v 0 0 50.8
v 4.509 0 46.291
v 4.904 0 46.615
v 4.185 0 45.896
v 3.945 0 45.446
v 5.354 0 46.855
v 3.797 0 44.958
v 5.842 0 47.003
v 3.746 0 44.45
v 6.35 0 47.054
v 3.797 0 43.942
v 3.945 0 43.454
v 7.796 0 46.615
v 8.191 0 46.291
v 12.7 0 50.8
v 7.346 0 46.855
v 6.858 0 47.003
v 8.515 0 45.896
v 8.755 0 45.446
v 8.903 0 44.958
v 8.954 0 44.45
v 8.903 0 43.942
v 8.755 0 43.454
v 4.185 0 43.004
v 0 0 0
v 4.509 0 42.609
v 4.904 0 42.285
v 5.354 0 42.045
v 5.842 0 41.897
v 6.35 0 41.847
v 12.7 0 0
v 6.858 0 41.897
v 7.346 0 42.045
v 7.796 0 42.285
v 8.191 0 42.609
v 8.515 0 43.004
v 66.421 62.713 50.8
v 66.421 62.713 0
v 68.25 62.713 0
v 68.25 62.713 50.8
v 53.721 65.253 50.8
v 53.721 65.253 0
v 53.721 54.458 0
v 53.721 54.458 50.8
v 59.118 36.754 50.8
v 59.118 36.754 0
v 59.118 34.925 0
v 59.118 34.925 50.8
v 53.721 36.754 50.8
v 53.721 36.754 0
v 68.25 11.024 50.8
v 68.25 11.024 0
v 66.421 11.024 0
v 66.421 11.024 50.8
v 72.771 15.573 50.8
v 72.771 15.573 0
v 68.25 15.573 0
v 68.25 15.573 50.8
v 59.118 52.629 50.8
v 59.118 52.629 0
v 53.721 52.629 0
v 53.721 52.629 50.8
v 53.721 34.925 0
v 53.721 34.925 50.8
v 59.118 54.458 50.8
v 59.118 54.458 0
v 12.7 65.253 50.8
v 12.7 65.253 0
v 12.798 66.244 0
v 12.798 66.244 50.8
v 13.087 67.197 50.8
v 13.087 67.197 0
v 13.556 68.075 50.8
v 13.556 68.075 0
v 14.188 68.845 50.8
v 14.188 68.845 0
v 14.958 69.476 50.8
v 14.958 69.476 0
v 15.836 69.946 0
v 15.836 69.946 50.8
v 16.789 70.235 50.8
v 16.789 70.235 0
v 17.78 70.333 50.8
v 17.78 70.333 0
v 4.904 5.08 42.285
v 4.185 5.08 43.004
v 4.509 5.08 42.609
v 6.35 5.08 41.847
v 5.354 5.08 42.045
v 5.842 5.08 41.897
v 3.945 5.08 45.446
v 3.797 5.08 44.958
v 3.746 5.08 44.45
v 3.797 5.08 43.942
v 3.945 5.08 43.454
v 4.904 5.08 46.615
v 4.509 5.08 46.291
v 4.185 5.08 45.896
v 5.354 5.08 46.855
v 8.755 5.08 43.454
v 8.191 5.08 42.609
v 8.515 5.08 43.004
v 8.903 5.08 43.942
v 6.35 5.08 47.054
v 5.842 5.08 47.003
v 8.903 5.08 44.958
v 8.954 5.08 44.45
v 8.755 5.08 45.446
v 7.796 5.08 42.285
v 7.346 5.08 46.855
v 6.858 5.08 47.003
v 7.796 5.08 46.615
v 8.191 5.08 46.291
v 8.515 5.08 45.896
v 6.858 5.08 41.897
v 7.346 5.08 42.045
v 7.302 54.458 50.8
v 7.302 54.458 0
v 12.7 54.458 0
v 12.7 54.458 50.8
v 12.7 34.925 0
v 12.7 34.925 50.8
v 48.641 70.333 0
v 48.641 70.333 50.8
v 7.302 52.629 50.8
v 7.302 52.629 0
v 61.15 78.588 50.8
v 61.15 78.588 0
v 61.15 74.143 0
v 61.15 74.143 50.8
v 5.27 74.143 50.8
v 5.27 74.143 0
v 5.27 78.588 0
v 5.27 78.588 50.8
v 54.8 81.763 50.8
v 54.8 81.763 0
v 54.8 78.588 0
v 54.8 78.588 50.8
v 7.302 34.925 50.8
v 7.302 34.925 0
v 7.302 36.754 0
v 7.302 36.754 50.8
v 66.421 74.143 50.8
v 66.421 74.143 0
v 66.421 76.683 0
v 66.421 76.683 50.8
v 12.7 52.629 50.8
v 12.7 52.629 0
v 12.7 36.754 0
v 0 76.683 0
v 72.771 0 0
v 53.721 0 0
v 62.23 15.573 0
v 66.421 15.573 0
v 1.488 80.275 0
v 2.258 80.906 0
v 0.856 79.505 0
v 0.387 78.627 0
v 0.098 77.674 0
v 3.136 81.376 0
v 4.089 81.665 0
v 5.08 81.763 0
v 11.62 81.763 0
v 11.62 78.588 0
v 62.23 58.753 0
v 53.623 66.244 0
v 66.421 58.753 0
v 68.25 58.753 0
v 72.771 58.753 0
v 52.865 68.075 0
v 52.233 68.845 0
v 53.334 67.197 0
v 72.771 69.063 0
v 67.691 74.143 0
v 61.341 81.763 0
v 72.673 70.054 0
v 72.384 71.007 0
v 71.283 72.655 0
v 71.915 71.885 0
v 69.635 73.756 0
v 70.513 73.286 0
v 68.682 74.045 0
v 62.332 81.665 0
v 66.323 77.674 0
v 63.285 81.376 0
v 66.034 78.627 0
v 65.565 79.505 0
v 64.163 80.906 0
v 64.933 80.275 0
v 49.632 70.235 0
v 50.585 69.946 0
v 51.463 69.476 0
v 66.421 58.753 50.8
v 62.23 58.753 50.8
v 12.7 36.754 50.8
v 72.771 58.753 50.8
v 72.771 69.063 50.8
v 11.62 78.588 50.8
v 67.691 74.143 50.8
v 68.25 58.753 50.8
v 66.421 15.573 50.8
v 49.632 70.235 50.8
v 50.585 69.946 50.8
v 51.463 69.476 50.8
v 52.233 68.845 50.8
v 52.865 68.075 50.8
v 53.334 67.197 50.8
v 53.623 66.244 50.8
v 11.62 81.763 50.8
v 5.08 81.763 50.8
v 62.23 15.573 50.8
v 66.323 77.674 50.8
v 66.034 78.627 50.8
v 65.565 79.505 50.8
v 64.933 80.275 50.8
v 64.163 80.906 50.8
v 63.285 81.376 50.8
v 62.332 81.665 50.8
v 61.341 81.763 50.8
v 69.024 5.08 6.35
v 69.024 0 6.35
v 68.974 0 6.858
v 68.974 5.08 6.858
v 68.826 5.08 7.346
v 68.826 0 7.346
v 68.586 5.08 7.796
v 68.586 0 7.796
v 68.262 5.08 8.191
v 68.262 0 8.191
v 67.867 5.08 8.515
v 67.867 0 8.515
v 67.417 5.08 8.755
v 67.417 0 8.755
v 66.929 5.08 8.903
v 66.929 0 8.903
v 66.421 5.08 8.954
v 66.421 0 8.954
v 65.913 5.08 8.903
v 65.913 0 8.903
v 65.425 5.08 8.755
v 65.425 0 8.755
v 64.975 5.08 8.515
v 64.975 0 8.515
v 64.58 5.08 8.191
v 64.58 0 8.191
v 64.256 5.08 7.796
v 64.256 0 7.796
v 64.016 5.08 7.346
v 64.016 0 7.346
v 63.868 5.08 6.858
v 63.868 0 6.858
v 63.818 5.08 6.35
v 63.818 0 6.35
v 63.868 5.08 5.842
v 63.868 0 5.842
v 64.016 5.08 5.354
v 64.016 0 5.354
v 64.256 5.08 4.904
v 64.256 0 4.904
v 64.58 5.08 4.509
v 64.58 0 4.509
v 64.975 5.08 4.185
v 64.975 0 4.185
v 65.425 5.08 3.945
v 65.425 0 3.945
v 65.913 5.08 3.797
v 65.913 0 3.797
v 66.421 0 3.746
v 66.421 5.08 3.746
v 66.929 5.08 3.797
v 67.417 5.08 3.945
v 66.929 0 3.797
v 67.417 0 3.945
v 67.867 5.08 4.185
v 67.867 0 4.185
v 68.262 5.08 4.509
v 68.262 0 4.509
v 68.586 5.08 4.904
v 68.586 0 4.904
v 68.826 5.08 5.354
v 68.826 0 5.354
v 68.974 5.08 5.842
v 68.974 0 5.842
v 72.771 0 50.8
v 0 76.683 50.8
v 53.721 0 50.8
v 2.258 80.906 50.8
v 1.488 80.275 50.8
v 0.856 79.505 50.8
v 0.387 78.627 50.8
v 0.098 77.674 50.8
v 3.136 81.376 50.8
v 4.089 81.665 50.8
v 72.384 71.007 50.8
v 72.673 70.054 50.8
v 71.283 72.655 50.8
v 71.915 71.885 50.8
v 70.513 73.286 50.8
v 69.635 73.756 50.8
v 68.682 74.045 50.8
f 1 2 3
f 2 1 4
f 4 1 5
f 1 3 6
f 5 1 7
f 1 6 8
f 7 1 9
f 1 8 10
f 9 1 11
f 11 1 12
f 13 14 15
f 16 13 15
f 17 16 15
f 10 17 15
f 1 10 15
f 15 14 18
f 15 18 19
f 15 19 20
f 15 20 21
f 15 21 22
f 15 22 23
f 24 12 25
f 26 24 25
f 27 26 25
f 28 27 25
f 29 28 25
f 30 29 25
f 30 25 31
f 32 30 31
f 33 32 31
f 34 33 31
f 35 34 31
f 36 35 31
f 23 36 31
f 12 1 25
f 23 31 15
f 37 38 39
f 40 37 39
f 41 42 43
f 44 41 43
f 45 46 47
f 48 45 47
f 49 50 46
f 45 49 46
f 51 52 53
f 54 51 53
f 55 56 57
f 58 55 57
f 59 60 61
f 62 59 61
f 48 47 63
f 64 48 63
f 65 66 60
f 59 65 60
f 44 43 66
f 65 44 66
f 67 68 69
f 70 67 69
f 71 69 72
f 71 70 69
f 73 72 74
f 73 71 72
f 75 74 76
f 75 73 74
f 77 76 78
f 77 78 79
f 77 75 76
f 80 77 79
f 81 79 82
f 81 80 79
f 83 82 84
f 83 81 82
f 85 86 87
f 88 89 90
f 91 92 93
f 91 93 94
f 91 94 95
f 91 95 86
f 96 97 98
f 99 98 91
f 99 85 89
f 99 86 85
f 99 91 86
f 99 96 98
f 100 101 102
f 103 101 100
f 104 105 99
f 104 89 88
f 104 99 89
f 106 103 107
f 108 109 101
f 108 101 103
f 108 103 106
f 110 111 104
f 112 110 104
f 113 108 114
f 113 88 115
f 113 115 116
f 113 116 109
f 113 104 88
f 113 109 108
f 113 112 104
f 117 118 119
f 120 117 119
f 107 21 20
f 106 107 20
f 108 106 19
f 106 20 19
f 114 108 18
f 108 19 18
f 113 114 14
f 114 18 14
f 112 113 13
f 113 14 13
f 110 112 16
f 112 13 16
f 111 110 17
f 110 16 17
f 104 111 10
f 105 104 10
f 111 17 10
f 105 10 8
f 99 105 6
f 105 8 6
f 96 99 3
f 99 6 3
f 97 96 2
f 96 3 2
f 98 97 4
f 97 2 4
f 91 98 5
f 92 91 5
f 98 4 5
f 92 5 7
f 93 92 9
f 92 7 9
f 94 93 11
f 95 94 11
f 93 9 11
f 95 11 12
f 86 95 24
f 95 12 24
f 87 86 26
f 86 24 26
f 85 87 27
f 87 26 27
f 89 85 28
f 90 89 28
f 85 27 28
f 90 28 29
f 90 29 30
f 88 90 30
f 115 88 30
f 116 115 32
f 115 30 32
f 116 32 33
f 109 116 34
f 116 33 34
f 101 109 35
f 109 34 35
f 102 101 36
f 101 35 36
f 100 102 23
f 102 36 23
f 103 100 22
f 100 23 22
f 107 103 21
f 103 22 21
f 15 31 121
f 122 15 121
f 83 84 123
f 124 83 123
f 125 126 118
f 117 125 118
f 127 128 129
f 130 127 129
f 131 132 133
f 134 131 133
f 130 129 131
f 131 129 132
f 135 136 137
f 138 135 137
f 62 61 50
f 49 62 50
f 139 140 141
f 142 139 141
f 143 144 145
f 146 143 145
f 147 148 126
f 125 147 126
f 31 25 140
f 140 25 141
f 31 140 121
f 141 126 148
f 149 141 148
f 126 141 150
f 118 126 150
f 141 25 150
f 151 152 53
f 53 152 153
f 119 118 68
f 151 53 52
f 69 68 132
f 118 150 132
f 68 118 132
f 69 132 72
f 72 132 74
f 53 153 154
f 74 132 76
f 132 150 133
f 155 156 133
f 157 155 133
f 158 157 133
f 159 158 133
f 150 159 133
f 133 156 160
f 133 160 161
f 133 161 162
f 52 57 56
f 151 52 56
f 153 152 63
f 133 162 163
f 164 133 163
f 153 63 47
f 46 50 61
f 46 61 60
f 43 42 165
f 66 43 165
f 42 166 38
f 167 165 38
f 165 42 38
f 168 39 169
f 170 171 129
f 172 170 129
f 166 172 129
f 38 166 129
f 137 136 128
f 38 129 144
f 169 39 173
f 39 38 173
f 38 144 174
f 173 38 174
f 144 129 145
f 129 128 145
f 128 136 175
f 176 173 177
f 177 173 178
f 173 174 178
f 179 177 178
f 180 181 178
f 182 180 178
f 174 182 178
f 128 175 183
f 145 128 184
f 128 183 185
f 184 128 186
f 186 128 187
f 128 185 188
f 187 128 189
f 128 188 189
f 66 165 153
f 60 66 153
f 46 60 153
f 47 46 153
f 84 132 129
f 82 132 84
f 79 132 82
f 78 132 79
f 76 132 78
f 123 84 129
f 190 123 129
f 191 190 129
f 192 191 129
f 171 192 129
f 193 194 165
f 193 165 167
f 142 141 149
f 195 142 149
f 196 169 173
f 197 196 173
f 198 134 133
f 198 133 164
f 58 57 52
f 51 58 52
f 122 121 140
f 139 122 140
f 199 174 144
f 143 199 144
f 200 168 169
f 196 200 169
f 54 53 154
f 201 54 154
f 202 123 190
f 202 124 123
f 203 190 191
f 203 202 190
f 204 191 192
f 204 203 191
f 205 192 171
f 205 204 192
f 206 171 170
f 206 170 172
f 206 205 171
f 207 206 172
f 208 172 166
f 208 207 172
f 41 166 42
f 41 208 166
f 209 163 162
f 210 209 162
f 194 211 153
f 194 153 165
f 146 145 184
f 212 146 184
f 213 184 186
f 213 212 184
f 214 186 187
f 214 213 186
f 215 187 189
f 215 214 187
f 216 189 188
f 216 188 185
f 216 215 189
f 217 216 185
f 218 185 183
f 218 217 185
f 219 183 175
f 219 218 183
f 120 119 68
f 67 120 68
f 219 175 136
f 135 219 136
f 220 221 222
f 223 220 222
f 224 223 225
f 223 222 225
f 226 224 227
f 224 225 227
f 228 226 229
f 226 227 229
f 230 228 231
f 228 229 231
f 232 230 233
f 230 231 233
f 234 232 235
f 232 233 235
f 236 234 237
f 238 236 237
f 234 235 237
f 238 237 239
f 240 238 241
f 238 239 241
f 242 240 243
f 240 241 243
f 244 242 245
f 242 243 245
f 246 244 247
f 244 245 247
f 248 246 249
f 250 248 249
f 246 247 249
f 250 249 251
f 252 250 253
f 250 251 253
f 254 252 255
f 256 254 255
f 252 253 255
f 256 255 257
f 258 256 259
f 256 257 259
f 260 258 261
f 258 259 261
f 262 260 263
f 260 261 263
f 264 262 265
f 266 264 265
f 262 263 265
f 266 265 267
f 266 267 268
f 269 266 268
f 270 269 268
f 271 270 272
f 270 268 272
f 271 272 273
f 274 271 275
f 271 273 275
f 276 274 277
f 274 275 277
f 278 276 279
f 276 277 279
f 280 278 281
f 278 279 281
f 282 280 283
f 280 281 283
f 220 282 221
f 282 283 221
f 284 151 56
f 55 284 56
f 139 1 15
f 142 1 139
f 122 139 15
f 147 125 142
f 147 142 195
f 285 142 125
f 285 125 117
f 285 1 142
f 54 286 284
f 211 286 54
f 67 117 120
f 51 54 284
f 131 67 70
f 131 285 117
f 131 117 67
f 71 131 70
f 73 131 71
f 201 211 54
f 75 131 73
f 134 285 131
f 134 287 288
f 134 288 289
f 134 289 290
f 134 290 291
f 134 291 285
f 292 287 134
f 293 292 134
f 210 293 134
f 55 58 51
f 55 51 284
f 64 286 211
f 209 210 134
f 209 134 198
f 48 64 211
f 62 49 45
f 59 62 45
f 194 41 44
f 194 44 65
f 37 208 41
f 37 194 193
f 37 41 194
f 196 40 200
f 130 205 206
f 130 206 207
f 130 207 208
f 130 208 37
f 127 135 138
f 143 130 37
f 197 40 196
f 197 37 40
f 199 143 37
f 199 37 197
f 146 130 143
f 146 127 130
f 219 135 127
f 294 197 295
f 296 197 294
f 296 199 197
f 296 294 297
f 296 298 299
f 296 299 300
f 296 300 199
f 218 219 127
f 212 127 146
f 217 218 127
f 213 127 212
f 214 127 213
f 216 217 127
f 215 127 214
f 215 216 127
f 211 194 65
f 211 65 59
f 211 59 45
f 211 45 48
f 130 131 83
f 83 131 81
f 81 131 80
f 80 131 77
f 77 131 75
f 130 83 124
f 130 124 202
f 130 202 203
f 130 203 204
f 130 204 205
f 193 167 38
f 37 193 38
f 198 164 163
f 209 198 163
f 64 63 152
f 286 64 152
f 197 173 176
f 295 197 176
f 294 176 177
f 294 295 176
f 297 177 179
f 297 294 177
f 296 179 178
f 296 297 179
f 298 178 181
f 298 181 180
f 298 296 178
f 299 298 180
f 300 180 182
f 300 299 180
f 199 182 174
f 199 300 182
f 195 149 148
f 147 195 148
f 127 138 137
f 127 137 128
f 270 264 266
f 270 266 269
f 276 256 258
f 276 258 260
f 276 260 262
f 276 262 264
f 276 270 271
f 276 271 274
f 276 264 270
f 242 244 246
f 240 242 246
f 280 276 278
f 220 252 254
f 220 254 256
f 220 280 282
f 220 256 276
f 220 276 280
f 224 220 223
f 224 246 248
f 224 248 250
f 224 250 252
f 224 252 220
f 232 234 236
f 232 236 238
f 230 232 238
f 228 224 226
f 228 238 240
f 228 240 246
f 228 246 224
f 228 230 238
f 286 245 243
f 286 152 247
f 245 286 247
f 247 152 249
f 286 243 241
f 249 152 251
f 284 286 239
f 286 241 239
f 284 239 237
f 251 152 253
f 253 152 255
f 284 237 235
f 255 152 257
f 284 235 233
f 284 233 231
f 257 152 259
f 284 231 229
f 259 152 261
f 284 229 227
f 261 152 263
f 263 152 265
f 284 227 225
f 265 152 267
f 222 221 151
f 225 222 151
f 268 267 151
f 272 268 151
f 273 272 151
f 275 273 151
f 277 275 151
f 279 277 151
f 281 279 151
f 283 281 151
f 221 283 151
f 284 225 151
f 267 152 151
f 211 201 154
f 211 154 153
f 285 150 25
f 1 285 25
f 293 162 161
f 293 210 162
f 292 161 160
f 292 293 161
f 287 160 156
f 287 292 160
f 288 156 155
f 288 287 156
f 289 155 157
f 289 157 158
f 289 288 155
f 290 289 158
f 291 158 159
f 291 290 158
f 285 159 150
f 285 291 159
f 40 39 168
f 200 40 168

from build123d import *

# Parameters (mm, degrees)
BOSS_EXTRUDE1_DEPTH = 50.8
SKETCH2_R           = 2.6035
CUT_EXTRUDE1_DEPTH  = 5.08
FILLET1_R           = 5.08


with BuildPart() as part:
    # Sketch1 → Boss-Extrude1 (new body)
    with BuildSketch(Plane.XY):
        Polygon((12.7, 54.4576), (12.7, 70.3326), (53.721, 70.3326), (53.721, 54.4576), (59.1185, 54.4576), (59.1185, 52.6288), (53.721, 52.6288), (53.721, 36.7538), (59.1185, 36.7538), (59.1185, 34.925), (53.721, 34.925), (53.721, 0), (72.771, 0), (72.771, 15.572598677), (68.2498, 15.572598677), (68.2498, 11.0236), (66.421, 11.0236), (66.421, 15.572598677), (62.23, 15.572598677), (62.23, 58.752598677), (66.421, 58.752598677), (66.421, 62.7126), (68.2498, 62.7126), (68.2498, 58.752598677), (72.771, 58.752598677), (72.771, 74.1426), (66.421, 74.1426), (66.421, 81.7626), (54.8005, 81.7626), (54.8005, 78.5876), (61.1505, 78.5876), (61.1505, 74.1426), (5.2705, 74.1426), (5.2705, 78.5876), (11.6205, 78.5876), (11.6205, 81.7626), (0, 81.7626), (0, 0), (12.7, 0), (12.7, 34.925), (7.3025, 34.925), (7.3025, 36.7538), (12.7, 36.7538), (12.7, 52.6288), (7.3025, 52.6288), (7.3025, 54.4576), align=None)
    extrude(amount=BOSS_EXTRUDE1_DEPTH)

    # Sketch2 → Cut-Extrude1 (cut)
    with BuildSketch(Plane.XZ):
        with Locations((6.35, 44.45)):
            Circle(SKETCH2_R)
        with Locations((66.421, 6.35)):
            Circle(SKETCH2_R)
    extrude(amount=-CUT_EXTRUDE1_DEPTH, mode=Mode.SUBTRACT)

    # Fillet1
    fillet1_edges = [part.edges().sort_by_distance(p)[0] for p in [
        (53.721, 70.3326, 25.4),
        (12.7, 70.3326, 25.4),
        (0, 81.7626, 25.4),
        (66.421, 81.7626, 25.4),
        (72.771, 74.1426, 25.4),
    ]]
    fillet(fillet1_edges, radius=FILLET1_R)


solid = part.part
